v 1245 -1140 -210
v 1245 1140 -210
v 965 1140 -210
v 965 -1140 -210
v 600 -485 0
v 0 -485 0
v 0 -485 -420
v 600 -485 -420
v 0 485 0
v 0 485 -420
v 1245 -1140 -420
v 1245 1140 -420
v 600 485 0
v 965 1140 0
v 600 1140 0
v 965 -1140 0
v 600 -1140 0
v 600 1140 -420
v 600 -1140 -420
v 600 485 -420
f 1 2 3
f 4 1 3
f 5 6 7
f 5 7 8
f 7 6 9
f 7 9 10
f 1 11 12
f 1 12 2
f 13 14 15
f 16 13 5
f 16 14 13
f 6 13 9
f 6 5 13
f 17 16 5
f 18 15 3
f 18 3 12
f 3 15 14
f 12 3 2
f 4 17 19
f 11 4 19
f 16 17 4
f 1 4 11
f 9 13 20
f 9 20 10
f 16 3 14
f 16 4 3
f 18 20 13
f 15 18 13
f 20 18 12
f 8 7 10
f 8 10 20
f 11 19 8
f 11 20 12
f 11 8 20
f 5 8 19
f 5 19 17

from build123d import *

# Parameters (mm, degrees)
F1_DEPTH = 1140
F2_W     = 600
F2_H     = 420
F3_DEPTH = 655
F4_W     = 600
F4_H     = 420
F5_DEPTH = 655


with BuildPart() as f1:
    # F0 (on Front) → F1 (new body, symmetric)
    with BuildSketch(Plane.XZ):
        Polygon((965, 0), (0, 0), (0, -420), (1245, -420), (1245, -210), (965, -210), align=None)
    extrude(amount=F1_DEPTH, both=True)

    # F2 (on face) → F3 (cut)
    with BuildSketch(Plane.XZ.offset(1140)):
        with Locations((300, -210)):
            Rectangle(F2_W, F2_H)
    extrude(amount=-F3_DEPTH, mode=Mode.SUBTRACT)

    # F4 (on face) → F5 (cut)
    with BuildSketch(Plane(origin=(0, 1140, 0), x_dir=(-1, 0, 0), z_dir=(0, 1, 0))):
        with Locations((-300, -210)):
            Rectangle(F4_W, F4_H)
    extrude(amount=-F5_DEPTH, mode=Mode.SUBTRACT)


solid = f1.part
